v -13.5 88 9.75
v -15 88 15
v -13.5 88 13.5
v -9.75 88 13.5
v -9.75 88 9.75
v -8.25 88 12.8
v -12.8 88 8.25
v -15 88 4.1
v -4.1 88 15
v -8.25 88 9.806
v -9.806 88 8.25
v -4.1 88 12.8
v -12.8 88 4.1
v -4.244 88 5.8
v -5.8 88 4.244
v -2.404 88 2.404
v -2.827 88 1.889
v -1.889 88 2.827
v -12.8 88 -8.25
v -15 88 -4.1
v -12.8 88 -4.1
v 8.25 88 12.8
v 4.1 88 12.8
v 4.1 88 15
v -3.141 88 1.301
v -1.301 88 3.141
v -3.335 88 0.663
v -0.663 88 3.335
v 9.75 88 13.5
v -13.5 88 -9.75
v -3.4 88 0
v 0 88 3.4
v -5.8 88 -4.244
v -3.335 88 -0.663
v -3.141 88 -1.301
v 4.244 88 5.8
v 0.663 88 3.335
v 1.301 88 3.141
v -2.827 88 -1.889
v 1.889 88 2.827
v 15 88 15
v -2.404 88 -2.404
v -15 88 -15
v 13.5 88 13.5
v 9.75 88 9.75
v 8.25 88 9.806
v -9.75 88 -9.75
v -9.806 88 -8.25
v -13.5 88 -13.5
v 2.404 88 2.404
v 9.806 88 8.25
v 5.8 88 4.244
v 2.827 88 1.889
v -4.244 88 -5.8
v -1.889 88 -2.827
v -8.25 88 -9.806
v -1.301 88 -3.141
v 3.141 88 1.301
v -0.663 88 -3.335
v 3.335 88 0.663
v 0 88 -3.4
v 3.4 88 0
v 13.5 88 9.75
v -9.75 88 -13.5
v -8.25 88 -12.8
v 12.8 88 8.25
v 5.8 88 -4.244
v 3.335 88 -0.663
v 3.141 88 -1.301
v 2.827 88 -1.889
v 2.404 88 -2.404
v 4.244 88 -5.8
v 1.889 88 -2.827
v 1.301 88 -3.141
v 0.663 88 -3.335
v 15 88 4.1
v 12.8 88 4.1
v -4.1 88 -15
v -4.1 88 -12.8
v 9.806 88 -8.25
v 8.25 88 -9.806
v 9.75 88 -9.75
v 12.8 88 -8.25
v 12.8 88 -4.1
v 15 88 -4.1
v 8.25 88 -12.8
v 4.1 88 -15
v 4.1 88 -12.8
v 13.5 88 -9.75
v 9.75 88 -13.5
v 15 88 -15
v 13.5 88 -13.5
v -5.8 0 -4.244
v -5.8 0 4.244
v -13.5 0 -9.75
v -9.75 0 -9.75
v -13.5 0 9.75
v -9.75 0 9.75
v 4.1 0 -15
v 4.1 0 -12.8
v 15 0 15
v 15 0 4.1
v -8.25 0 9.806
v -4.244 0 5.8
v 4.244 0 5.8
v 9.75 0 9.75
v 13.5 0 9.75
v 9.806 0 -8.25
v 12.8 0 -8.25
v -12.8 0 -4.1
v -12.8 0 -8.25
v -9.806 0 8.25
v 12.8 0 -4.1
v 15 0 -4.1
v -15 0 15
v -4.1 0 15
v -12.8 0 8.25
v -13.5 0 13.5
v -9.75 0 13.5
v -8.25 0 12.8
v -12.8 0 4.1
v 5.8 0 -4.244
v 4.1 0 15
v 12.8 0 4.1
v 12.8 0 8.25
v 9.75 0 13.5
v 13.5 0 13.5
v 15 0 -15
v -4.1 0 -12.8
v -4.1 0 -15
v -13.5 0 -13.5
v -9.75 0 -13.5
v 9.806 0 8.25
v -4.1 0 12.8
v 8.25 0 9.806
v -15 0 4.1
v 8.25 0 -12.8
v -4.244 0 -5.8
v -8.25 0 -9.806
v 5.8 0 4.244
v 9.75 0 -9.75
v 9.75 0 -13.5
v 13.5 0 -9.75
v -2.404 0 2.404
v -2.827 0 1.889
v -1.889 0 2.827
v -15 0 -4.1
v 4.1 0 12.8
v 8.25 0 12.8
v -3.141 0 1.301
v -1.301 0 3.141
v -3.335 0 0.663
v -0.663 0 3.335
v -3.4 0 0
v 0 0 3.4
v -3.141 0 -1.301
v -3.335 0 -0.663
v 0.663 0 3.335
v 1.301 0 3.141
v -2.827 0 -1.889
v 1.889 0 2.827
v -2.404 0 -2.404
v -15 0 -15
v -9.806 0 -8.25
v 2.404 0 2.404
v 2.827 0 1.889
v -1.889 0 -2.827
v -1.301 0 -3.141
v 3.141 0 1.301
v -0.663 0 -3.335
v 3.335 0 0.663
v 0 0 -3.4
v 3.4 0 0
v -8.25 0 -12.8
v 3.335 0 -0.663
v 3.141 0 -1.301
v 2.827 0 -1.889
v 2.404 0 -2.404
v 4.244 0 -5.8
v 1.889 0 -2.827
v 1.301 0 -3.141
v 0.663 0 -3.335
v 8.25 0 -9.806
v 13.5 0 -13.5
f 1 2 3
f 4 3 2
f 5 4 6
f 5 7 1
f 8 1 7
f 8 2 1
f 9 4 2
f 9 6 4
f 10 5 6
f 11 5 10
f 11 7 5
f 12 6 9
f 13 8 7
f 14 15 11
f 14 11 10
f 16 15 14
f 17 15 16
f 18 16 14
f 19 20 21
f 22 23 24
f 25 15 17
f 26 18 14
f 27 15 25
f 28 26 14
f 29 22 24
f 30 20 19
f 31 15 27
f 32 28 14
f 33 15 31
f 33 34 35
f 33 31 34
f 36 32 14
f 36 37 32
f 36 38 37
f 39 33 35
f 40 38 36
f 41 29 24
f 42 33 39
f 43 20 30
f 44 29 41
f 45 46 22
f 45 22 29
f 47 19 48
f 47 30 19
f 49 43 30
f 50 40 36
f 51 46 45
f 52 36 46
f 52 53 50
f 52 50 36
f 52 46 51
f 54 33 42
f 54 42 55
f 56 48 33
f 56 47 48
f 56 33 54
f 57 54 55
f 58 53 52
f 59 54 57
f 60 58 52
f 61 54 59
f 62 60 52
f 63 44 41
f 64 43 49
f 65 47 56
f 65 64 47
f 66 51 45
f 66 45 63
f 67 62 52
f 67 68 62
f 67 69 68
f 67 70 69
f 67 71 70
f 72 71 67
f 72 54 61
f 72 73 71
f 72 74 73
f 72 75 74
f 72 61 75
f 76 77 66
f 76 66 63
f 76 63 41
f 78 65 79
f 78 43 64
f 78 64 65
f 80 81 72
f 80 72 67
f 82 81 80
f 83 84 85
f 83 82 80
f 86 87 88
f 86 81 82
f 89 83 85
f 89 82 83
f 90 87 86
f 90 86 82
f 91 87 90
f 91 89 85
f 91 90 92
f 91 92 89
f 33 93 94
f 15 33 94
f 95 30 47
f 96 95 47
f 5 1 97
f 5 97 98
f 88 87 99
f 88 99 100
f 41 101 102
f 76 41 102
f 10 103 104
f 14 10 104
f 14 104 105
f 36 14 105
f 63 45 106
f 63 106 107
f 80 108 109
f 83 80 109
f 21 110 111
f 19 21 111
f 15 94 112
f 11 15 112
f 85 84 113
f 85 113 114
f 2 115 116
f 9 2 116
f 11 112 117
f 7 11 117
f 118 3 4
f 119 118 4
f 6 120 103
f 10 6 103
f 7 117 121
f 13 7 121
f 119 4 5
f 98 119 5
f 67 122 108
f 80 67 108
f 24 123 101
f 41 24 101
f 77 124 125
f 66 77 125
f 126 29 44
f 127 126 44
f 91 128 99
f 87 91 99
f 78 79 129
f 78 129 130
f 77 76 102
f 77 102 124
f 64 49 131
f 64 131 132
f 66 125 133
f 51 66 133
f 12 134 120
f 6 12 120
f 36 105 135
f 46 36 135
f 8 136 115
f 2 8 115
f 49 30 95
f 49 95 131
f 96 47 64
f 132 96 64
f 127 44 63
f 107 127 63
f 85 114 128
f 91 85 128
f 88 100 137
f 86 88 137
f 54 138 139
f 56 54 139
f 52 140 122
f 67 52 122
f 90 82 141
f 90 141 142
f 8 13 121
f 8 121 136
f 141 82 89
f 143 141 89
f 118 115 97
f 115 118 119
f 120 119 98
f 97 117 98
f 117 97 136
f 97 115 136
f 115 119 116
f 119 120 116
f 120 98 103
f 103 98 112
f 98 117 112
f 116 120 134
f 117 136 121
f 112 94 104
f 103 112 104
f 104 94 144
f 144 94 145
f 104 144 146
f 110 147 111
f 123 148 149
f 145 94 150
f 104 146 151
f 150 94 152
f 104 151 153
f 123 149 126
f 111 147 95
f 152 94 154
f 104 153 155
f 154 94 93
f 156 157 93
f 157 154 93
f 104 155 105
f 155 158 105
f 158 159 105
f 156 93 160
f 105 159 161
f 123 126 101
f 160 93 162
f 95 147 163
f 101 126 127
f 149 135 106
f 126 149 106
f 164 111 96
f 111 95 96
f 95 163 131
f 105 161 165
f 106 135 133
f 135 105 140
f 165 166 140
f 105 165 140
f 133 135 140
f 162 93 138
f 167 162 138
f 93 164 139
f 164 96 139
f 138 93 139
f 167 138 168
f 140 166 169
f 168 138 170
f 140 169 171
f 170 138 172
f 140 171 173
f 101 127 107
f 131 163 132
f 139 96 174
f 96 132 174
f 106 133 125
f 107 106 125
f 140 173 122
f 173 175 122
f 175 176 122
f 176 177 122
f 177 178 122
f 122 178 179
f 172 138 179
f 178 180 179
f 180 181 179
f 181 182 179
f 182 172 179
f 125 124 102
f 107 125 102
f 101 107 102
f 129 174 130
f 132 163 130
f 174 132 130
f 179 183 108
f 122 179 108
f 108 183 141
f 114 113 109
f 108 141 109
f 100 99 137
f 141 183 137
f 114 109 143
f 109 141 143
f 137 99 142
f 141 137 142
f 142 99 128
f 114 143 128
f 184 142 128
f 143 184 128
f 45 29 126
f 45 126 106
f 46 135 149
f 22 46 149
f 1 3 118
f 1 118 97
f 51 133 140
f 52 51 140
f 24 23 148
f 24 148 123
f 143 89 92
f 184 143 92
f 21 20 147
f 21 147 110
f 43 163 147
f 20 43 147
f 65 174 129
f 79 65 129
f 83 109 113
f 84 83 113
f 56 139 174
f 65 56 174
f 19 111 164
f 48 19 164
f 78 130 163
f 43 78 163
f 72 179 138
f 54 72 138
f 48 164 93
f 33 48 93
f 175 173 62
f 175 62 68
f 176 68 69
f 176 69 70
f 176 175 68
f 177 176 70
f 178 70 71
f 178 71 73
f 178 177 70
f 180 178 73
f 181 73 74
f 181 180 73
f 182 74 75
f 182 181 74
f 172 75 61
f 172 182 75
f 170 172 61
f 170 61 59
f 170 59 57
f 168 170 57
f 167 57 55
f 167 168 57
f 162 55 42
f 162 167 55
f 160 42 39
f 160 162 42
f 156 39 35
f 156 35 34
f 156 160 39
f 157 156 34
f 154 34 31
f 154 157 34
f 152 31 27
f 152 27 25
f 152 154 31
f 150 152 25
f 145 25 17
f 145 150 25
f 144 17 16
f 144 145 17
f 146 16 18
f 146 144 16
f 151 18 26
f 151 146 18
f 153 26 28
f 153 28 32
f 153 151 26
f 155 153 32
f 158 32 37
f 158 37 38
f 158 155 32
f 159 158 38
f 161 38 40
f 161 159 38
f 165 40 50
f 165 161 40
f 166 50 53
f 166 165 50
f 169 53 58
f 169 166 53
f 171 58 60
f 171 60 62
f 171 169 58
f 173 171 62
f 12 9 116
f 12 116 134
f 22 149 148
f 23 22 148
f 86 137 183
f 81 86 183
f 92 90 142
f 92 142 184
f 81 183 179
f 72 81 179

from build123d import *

# Parameters (mm, degrees)
SZKIC1_R                    = 3.4
SZKIC1_W                    = 3.75
SZKIC1_H                    = 3.75
DODANIE_WYCI_GNI_CIE1_DEPTH = 88


with BuildPart() as part:
    # Szkic1 → Dodanie-wyciągnięcie1 (new body)
    with BuildSketch(Plane(origin=(0, 0, 0), x_dir=(1, 0, 0), z_dir=(0, 1, 0))):
        Polygon((4.1, 15), (4.1, 12.8), (8.25, 12.8), (8.25, 9.805634919), (4.244365081, 5.8), (-4.244365081, 5.8), (-8.25, 9.805634919), (-8.25, 12.8), (-4.1, 12.8), (-4.1, 15), (-15, 15), (-15, 4.1), (-12.8, 4.1), (-12.8, 8.25), (-9.805634919, 8.25), (-5.8, 4.244365081), (-5.8, -4.244365081), (-9.805634919, -8.25), (-12.8, -8.25), (-12.8, -4.1), (-15, -4.1), (-15, -15), (-4.1, -15), (-4.1, -12.8), (-8.25, -12.8), (-8.25, -9.805634919), (-4.244365081, -5.8), (4.244365081, -5.8), (8.25, -9.805634919), (8.25, -12.8), (4.1, -12.8), (4.1, -15), (15, -15), (15, -4.1), (12.8, -4.1), (12.8, -8.25), (9.805634919, -8.25), (5.8, -4.244365081), (5.8, 4.244365081), (9.805634919, 8.25), (12.8, 8.25), (12.8, 4.1), (15, 4.1), (15, 15), align=None)
        Circle(SZKIC1_R, mode=Mode.SUBTRACT)
        with Locations((11.625, 11.625)):
            Rectangle(SZKIC1_W, SZKIC1_H, mode=Mode.SUBTRACT)
        with Locations((11.625, -11.625)):
            Rectangle(SZKIC1_W, SZKIC1_H, mode=Mode.SUBTRACT)
        with Locations((-11.625, -11.625)):
            Rectangle(SZKIC1_W, SZKIC1_H, mode=Mode.SUBTRACT)
        with Locations((-11.625, 11.625)):
            Rectangle(SZKIC1_W, SZKIC1_H, mode=Mode.SUBTRACT)
    extrude(amount=DODANIE_WYCI_GNI_CIE1_DEPTH)


solid = part.part
